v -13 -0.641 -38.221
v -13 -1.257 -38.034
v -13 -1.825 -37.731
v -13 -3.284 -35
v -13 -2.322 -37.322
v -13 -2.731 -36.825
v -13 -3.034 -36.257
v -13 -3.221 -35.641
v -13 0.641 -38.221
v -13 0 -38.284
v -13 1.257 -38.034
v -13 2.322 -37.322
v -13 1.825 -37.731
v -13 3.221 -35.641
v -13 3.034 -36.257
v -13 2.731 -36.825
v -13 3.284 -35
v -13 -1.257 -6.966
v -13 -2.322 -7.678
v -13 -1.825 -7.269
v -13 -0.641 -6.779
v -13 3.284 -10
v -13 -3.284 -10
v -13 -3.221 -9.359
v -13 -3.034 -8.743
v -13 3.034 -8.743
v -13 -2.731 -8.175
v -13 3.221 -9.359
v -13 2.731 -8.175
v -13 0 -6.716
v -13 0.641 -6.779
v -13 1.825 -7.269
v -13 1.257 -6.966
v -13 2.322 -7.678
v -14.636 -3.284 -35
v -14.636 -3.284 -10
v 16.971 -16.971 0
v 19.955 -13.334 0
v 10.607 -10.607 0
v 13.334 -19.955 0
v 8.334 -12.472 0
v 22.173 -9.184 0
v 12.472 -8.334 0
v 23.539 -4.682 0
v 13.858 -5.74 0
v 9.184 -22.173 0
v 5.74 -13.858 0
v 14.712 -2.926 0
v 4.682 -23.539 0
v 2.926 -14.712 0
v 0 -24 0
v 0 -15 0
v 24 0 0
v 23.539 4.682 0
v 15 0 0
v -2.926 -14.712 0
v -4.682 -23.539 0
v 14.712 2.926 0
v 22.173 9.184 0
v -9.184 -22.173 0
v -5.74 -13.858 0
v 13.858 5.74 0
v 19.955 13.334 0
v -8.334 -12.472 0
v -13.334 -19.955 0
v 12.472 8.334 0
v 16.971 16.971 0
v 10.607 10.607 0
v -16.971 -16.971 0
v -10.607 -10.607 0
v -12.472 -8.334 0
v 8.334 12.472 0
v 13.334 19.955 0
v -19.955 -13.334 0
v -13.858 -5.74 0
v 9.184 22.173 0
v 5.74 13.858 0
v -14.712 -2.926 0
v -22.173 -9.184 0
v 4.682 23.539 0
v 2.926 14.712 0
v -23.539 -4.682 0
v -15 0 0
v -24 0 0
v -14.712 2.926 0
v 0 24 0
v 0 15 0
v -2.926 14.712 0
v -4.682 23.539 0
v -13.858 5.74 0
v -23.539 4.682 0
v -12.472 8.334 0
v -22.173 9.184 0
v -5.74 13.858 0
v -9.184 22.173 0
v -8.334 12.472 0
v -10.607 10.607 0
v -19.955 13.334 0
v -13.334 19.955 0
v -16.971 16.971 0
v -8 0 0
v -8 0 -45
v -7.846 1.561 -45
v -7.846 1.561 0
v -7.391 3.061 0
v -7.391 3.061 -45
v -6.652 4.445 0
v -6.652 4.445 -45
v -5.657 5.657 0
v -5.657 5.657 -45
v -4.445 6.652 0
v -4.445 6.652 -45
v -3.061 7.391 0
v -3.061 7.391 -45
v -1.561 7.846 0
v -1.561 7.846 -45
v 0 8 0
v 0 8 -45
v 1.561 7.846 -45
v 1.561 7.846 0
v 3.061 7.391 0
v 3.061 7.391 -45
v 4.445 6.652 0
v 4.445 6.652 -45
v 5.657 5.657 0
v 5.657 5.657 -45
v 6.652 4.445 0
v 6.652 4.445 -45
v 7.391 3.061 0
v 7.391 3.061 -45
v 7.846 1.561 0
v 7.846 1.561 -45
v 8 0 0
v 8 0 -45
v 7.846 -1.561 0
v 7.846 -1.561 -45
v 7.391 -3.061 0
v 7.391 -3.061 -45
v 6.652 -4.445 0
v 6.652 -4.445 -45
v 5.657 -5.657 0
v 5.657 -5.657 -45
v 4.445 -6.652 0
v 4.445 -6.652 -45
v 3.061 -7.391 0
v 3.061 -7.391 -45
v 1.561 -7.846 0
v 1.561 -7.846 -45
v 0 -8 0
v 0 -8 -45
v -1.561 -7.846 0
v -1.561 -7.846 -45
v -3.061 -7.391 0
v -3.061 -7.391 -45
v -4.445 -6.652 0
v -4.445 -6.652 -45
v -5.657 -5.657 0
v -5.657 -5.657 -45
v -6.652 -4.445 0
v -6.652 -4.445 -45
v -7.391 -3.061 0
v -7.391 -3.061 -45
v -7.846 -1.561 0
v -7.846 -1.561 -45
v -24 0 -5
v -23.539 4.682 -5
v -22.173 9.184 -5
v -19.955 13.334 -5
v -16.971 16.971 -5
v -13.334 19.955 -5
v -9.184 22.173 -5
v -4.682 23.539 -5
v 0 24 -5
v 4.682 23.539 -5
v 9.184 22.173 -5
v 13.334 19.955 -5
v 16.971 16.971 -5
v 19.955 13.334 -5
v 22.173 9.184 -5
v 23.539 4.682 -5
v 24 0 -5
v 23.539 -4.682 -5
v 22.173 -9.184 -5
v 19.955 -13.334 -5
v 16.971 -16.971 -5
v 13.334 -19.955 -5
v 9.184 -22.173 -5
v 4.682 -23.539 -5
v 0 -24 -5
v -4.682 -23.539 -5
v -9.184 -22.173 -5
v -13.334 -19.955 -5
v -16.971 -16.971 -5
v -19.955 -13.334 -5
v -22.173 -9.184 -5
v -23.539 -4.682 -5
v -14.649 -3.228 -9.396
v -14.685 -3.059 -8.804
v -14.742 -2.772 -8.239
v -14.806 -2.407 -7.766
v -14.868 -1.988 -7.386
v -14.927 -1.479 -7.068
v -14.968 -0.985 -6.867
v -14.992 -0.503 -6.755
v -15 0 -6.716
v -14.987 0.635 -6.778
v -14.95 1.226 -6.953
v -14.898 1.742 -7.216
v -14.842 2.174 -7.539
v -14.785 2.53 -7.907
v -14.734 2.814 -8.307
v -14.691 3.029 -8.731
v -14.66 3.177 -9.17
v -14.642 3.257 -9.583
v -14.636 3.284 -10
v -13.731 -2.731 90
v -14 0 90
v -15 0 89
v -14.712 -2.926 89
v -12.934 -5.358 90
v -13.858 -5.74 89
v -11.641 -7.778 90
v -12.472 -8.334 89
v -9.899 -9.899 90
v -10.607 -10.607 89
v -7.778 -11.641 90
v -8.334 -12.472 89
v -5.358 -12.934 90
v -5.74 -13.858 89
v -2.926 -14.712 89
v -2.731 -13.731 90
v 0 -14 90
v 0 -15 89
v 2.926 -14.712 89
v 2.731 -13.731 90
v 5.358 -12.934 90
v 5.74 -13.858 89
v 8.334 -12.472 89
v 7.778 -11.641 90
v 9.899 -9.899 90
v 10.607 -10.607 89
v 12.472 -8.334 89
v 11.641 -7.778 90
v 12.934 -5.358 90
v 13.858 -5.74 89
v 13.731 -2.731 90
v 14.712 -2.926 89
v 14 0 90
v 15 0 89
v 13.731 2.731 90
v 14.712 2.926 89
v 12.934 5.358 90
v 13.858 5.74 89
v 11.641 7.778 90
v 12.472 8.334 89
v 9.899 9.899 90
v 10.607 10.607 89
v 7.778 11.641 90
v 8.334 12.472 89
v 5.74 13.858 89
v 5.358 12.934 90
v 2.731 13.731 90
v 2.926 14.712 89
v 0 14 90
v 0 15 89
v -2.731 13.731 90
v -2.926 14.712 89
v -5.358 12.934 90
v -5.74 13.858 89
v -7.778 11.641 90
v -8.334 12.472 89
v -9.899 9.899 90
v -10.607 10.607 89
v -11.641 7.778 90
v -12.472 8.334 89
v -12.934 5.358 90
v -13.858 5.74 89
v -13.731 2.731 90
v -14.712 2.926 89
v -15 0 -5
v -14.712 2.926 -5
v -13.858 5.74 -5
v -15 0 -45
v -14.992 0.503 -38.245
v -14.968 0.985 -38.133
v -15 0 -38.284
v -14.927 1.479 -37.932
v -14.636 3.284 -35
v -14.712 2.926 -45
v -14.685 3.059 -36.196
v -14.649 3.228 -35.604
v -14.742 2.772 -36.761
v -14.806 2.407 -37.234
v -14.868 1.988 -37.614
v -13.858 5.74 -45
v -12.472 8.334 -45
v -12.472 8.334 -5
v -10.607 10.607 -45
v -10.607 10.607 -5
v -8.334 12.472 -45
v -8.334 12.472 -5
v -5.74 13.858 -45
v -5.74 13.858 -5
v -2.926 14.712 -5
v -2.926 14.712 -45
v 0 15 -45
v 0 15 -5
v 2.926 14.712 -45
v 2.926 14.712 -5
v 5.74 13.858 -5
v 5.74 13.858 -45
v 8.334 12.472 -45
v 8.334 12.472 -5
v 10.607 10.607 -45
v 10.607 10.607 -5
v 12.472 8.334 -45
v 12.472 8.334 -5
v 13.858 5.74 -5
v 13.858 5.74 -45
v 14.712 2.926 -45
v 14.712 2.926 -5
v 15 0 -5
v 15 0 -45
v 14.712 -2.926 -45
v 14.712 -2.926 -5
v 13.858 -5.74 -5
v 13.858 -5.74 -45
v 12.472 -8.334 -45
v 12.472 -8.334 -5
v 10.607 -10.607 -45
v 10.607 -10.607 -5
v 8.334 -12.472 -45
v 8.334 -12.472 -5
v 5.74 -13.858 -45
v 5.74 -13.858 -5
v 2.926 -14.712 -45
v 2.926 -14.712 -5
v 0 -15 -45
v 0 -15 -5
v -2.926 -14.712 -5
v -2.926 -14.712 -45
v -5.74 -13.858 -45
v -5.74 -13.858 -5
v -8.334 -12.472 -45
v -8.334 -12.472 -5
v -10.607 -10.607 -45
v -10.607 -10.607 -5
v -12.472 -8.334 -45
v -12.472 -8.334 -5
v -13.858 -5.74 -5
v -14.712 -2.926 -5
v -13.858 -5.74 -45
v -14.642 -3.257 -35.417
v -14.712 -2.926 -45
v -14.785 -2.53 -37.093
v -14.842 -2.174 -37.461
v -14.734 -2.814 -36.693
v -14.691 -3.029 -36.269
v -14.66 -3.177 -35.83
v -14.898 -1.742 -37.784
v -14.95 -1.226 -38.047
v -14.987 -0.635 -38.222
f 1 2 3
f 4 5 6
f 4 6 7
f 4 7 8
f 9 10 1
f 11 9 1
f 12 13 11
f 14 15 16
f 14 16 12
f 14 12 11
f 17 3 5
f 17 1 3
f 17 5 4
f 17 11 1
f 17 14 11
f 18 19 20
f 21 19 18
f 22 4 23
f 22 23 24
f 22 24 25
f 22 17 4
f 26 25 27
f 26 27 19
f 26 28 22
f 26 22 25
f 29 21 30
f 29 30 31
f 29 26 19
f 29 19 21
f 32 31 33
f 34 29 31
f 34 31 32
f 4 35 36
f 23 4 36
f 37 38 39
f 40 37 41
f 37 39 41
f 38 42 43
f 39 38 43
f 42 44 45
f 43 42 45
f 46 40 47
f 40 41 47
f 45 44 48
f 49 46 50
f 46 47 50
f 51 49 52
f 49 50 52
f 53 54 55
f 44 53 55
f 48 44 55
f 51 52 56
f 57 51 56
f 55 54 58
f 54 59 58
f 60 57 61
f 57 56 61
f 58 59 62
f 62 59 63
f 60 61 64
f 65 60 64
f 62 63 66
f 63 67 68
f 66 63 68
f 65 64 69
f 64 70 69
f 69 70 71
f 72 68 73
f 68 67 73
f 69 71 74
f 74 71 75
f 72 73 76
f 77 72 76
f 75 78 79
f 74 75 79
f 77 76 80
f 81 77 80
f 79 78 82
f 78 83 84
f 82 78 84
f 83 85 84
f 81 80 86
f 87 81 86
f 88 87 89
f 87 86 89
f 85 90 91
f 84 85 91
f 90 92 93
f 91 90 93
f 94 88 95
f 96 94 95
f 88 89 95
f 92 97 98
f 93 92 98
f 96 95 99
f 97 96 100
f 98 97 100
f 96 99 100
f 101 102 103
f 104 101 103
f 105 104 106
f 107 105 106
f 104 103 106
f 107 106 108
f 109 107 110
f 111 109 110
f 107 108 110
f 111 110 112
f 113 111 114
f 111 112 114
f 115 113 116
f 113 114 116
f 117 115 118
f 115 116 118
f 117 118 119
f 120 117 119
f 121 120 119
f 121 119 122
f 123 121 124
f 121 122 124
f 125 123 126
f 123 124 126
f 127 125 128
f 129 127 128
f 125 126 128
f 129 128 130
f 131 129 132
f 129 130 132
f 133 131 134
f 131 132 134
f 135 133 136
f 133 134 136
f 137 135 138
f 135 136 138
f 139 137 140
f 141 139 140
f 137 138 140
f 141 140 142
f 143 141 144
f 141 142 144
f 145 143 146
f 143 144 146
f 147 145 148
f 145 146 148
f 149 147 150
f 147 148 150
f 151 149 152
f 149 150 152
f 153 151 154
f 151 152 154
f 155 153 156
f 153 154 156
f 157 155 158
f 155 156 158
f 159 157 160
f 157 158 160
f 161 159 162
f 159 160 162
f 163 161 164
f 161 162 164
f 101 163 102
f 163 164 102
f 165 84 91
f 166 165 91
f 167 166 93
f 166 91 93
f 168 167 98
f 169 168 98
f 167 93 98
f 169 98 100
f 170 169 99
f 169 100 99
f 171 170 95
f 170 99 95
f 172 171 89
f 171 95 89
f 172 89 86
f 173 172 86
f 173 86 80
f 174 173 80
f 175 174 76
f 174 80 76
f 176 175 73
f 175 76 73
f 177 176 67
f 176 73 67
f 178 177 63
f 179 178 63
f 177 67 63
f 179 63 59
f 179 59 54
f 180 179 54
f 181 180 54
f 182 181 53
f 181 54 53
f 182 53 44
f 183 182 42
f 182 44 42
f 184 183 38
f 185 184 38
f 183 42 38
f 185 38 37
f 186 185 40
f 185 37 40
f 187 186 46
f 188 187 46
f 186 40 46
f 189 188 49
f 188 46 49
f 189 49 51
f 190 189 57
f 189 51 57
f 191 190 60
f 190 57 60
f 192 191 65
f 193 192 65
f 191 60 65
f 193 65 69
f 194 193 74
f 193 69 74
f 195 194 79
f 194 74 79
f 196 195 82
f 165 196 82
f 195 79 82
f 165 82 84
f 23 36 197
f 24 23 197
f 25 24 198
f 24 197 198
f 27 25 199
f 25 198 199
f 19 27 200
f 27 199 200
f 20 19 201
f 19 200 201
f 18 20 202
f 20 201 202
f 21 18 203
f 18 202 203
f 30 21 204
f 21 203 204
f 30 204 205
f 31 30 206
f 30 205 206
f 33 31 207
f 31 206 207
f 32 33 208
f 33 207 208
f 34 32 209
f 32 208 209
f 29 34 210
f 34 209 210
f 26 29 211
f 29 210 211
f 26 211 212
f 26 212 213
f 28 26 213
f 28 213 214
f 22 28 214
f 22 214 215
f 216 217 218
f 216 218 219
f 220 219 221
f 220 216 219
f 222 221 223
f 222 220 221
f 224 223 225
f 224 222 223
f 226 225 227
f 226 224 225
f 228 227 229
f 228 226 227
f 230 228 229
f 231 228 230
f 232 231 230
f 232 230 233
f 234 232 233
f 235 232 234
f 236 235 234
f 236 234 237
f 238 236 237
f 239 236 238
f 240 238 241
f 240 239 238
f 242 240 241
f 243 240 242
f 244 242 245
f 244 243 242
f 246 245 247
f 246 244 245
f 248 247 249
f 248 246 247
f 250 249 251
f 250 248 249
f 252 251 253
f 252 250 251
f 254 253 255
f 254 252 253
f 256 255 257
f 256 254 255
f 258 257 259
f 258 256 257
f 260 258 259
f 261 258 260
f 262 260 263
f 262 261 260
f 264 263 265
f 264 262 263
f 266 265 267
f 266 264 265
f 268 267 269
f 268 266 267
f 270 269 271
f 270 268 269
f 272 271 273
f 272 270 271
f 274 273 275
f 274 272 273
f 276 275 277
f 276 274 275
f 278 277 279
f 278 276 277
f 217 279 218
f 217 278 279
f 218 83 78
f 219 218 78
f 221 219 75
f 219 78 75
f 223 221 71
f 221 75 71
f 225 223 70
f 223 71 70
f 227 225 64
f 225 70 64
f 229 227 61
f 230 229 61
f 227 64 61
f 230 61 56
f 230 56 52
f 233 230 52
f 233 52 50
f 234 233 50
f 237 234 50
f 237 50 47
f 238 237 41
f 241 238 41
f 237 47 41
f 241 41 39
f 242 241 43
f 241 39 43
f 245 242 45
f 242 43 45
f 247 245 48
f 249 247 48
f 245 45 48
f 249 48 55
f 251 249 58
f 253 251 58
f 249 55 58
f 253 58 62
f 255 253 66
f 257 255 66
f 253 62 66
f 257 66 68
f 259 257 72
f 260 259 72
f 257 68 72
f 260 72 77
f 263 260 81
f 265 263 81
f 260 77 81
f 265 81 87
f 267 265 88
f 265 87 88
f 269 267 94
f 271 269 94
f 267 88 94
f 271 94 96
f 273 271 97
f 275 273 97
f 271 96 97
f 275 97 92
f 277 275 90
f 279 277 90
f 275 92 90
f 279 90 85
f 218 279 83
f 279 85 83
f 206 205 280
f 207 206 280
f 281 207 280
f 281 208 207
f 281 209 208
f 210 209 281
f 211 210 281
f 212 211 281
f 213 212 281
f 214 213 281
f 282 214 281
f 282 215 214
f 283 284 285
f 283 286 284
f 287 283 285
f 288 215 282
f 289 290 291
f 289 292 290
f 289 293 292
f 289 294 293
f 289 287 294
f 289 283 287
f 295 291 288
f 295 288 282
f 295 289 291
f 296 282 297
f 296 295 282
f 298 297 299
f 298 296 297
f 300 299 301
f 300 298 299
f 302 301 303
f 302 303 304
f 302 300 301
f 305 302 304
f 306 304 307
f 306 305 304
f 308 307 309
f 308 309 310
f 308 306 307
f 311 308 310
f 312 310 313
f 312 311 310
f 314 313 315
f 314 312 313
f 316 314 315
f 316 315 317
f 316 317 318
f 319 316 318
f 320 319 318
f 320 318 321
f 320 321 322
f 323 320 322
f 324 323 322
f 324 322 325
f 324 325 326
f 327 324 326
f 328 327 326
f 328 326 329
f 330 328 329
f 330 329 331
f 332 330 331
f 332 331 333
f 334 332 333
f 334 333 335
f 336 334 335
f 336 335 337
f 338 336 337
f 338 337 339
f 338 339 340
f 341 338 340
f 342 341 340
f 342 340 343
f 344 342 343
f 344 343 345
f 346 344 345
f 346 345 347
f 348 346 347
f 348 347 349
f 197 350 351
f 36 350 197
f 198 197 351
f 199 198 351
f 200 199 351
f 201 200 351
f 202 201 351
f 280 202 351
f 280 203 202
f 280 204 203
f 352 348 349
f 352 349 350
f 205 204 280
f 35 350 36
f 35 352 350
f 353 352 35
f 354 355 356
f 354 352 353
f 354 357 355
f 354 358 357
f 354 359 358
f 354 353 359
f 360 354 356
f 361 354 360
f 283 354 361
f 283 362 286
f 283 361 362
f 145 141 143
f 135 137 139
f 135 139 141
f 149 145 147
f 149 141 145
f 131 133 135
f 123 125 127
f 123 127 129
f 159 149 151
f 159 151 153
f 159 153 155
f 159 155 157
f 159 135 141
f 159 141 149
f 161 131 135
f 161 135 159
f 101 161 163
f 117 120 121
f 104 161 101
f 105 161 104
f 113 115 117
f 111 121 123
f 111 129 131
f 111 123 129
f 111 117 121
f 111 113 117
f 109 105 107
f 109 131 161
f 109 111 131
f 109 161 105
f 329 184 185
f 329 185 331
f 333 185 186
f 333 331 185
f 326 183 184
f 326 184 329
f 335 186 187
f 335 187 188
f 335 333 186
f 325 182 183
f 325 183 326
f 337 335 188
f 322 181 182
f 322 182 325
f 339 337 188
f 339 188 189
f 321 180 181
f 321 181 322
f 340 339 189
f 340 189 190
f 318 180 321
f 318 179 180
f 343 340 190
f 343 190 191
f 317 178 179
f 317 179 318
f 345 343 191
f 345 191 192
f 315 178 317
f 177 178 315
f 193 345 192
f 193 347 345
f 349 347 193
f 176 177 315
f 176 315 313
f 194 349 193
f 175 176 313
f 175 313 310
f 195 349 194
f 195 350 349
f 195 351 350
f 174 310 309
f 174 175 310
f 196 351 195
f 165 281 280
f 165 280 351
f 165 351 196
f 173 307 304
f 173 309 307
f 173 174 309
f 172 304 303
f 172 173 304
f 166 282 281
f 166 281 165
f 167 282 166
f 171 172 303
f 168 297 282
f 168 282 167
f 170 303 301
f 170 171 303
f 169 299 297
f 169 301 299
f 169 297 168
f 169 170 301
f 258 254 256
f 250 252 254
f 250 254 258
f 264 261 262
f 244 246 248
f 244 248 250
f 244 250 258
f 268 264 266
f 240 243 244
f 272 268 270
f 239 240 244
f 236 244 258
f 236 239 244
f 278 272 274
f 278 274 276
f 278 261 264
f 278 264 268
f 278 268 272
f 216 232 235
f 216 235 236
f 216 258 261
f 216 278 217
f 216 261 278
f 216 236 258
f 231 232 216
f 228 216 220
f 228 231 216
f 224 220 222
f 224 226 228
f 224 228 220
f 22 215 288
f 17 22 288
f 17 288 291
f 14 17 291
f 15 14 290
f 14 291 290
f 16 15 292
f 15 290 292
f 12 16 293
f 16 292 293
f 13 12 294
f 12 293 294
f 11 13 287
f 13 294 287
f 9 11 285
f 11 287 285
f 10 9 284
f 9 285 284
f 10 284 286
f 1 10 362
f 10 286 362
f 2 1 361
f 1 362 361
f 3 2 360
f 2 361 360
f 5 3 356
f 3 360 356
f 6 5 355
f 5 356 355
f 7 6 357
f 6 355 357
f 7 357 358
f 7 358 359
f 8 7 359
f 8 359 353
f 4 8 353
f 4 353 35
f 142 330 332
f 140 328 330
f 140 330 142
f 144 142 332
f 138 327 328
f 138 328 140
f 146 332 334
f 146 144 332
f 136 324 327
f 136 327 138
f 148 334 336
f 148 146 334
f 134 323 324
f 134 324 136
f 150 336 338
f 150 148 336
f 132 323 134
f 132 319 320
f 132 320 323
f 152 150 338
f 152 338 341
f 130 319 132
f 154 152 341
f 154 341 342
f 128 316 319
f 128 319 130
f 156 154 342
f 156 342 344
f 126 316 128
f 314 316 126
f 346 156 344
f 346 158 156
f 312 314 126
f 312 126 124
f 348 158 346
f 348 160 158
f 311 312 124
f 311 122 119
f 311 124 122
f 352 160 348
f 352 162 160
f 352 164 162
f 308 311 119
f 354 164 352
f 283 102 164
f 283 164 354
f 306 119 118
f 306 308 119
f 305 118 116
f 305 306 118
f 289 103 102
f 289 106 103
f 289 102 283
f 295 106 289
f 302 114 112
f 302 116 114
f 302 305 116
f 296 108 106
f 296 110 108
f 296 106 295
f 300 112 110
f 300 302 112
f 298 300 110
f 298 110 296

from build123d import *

# Parameters (mm, degrees)
SKETCH1_R           = 15
BOSS_EXTRUDE1_DEPTH = 90
SKETCH2_R           = 24
BOSS_EXTRUDE2_DEPTH = 5
CHAMFER1_SIZE       = 1
BOSS_EXTRUDE3_START = 40
SKETCH4_R           = 15
BOSS_EXTRUDE3_DEPTH = 40
CUT_EXTRUDE1_DEPTH  = 2
SKETCH6_R           = 8
CUT_EXTRUDE2_DEPTH  = 45


with BuildPart() as part:
    # Sketch1 → Boss-Extrude1 (new body)
    with BuildSketch(Plane.XY):
        Circle(SKETCH1_R)
    extrude(amount=BOSS_EXTRUDE1_DEPTH)

    # Sketch2 → Boss-Extrude2 (add)
    with BuildSketch(Plane(origin=(0, 0, 0), x_dir=(-1, 0, 0), z_dir=(0, 0, -1))):
        Circle(SKETCH2_R)
    extrude(amount=BOSS_EXTRUDE2_DEPTH)

    # Chamfer1
    chamfer1_edges = [part.edges().sort_by_distance(p)[0] for p in [
        (-15, 0, 90),
    ]]
    chamfer(chamfer1_edges, length=CHAMFER1_SIZE)

    # Sketch4 → Boss-Extrude3 (add)
    with BuildSketch(Plane(origin=(0, 0, -5), x_dir=(-1, 0, 0), z_dir=(0, 0, -1)).offset(BOSS_EXTRUDE3_START)):
        Circle(SKETCH4_R)
    extrude(amount=-BOSS_EXTRUDE3_DEPTH)

    # Sketch5 → Cut-Extrude1 (cut)
    with BuildSketch(Plane(origin=(-15, 0, -45), x_dir=(0, 0, -1), z_dir=(1, 0, 0))):
        with BuildLine():
            Line((-35, 3.284094305), (-10, 3.284094305))
            ThreePointArc((-10, 3.284094305), (-6.715905695, 0), (-10, -3.284094305))
            Line((-10, -3.284094305), (-35, -3.284094305))
            ThreePointArc((-35, -3.284094305), (-38.284094305, 0), (-35, 3.284094305))
        make_face()
    extrude(amount=CUT_EXTRUDE1_DEPTH, mode=Mode.SUBTRACT)

    # Sketch6 → Cut-Extrude2 (cut)
    with BuildSketch(Plane(origin=(0, 0, -45), x_dir=(-1, 0, 0), z_dir=(0, 0, -1))):
        Circle(SKETCH6_R)
    extrude(amount=-CUT_EXTRUDE2_DEPTH, mode=Mode.SUBTRACT)


solid = part.part
